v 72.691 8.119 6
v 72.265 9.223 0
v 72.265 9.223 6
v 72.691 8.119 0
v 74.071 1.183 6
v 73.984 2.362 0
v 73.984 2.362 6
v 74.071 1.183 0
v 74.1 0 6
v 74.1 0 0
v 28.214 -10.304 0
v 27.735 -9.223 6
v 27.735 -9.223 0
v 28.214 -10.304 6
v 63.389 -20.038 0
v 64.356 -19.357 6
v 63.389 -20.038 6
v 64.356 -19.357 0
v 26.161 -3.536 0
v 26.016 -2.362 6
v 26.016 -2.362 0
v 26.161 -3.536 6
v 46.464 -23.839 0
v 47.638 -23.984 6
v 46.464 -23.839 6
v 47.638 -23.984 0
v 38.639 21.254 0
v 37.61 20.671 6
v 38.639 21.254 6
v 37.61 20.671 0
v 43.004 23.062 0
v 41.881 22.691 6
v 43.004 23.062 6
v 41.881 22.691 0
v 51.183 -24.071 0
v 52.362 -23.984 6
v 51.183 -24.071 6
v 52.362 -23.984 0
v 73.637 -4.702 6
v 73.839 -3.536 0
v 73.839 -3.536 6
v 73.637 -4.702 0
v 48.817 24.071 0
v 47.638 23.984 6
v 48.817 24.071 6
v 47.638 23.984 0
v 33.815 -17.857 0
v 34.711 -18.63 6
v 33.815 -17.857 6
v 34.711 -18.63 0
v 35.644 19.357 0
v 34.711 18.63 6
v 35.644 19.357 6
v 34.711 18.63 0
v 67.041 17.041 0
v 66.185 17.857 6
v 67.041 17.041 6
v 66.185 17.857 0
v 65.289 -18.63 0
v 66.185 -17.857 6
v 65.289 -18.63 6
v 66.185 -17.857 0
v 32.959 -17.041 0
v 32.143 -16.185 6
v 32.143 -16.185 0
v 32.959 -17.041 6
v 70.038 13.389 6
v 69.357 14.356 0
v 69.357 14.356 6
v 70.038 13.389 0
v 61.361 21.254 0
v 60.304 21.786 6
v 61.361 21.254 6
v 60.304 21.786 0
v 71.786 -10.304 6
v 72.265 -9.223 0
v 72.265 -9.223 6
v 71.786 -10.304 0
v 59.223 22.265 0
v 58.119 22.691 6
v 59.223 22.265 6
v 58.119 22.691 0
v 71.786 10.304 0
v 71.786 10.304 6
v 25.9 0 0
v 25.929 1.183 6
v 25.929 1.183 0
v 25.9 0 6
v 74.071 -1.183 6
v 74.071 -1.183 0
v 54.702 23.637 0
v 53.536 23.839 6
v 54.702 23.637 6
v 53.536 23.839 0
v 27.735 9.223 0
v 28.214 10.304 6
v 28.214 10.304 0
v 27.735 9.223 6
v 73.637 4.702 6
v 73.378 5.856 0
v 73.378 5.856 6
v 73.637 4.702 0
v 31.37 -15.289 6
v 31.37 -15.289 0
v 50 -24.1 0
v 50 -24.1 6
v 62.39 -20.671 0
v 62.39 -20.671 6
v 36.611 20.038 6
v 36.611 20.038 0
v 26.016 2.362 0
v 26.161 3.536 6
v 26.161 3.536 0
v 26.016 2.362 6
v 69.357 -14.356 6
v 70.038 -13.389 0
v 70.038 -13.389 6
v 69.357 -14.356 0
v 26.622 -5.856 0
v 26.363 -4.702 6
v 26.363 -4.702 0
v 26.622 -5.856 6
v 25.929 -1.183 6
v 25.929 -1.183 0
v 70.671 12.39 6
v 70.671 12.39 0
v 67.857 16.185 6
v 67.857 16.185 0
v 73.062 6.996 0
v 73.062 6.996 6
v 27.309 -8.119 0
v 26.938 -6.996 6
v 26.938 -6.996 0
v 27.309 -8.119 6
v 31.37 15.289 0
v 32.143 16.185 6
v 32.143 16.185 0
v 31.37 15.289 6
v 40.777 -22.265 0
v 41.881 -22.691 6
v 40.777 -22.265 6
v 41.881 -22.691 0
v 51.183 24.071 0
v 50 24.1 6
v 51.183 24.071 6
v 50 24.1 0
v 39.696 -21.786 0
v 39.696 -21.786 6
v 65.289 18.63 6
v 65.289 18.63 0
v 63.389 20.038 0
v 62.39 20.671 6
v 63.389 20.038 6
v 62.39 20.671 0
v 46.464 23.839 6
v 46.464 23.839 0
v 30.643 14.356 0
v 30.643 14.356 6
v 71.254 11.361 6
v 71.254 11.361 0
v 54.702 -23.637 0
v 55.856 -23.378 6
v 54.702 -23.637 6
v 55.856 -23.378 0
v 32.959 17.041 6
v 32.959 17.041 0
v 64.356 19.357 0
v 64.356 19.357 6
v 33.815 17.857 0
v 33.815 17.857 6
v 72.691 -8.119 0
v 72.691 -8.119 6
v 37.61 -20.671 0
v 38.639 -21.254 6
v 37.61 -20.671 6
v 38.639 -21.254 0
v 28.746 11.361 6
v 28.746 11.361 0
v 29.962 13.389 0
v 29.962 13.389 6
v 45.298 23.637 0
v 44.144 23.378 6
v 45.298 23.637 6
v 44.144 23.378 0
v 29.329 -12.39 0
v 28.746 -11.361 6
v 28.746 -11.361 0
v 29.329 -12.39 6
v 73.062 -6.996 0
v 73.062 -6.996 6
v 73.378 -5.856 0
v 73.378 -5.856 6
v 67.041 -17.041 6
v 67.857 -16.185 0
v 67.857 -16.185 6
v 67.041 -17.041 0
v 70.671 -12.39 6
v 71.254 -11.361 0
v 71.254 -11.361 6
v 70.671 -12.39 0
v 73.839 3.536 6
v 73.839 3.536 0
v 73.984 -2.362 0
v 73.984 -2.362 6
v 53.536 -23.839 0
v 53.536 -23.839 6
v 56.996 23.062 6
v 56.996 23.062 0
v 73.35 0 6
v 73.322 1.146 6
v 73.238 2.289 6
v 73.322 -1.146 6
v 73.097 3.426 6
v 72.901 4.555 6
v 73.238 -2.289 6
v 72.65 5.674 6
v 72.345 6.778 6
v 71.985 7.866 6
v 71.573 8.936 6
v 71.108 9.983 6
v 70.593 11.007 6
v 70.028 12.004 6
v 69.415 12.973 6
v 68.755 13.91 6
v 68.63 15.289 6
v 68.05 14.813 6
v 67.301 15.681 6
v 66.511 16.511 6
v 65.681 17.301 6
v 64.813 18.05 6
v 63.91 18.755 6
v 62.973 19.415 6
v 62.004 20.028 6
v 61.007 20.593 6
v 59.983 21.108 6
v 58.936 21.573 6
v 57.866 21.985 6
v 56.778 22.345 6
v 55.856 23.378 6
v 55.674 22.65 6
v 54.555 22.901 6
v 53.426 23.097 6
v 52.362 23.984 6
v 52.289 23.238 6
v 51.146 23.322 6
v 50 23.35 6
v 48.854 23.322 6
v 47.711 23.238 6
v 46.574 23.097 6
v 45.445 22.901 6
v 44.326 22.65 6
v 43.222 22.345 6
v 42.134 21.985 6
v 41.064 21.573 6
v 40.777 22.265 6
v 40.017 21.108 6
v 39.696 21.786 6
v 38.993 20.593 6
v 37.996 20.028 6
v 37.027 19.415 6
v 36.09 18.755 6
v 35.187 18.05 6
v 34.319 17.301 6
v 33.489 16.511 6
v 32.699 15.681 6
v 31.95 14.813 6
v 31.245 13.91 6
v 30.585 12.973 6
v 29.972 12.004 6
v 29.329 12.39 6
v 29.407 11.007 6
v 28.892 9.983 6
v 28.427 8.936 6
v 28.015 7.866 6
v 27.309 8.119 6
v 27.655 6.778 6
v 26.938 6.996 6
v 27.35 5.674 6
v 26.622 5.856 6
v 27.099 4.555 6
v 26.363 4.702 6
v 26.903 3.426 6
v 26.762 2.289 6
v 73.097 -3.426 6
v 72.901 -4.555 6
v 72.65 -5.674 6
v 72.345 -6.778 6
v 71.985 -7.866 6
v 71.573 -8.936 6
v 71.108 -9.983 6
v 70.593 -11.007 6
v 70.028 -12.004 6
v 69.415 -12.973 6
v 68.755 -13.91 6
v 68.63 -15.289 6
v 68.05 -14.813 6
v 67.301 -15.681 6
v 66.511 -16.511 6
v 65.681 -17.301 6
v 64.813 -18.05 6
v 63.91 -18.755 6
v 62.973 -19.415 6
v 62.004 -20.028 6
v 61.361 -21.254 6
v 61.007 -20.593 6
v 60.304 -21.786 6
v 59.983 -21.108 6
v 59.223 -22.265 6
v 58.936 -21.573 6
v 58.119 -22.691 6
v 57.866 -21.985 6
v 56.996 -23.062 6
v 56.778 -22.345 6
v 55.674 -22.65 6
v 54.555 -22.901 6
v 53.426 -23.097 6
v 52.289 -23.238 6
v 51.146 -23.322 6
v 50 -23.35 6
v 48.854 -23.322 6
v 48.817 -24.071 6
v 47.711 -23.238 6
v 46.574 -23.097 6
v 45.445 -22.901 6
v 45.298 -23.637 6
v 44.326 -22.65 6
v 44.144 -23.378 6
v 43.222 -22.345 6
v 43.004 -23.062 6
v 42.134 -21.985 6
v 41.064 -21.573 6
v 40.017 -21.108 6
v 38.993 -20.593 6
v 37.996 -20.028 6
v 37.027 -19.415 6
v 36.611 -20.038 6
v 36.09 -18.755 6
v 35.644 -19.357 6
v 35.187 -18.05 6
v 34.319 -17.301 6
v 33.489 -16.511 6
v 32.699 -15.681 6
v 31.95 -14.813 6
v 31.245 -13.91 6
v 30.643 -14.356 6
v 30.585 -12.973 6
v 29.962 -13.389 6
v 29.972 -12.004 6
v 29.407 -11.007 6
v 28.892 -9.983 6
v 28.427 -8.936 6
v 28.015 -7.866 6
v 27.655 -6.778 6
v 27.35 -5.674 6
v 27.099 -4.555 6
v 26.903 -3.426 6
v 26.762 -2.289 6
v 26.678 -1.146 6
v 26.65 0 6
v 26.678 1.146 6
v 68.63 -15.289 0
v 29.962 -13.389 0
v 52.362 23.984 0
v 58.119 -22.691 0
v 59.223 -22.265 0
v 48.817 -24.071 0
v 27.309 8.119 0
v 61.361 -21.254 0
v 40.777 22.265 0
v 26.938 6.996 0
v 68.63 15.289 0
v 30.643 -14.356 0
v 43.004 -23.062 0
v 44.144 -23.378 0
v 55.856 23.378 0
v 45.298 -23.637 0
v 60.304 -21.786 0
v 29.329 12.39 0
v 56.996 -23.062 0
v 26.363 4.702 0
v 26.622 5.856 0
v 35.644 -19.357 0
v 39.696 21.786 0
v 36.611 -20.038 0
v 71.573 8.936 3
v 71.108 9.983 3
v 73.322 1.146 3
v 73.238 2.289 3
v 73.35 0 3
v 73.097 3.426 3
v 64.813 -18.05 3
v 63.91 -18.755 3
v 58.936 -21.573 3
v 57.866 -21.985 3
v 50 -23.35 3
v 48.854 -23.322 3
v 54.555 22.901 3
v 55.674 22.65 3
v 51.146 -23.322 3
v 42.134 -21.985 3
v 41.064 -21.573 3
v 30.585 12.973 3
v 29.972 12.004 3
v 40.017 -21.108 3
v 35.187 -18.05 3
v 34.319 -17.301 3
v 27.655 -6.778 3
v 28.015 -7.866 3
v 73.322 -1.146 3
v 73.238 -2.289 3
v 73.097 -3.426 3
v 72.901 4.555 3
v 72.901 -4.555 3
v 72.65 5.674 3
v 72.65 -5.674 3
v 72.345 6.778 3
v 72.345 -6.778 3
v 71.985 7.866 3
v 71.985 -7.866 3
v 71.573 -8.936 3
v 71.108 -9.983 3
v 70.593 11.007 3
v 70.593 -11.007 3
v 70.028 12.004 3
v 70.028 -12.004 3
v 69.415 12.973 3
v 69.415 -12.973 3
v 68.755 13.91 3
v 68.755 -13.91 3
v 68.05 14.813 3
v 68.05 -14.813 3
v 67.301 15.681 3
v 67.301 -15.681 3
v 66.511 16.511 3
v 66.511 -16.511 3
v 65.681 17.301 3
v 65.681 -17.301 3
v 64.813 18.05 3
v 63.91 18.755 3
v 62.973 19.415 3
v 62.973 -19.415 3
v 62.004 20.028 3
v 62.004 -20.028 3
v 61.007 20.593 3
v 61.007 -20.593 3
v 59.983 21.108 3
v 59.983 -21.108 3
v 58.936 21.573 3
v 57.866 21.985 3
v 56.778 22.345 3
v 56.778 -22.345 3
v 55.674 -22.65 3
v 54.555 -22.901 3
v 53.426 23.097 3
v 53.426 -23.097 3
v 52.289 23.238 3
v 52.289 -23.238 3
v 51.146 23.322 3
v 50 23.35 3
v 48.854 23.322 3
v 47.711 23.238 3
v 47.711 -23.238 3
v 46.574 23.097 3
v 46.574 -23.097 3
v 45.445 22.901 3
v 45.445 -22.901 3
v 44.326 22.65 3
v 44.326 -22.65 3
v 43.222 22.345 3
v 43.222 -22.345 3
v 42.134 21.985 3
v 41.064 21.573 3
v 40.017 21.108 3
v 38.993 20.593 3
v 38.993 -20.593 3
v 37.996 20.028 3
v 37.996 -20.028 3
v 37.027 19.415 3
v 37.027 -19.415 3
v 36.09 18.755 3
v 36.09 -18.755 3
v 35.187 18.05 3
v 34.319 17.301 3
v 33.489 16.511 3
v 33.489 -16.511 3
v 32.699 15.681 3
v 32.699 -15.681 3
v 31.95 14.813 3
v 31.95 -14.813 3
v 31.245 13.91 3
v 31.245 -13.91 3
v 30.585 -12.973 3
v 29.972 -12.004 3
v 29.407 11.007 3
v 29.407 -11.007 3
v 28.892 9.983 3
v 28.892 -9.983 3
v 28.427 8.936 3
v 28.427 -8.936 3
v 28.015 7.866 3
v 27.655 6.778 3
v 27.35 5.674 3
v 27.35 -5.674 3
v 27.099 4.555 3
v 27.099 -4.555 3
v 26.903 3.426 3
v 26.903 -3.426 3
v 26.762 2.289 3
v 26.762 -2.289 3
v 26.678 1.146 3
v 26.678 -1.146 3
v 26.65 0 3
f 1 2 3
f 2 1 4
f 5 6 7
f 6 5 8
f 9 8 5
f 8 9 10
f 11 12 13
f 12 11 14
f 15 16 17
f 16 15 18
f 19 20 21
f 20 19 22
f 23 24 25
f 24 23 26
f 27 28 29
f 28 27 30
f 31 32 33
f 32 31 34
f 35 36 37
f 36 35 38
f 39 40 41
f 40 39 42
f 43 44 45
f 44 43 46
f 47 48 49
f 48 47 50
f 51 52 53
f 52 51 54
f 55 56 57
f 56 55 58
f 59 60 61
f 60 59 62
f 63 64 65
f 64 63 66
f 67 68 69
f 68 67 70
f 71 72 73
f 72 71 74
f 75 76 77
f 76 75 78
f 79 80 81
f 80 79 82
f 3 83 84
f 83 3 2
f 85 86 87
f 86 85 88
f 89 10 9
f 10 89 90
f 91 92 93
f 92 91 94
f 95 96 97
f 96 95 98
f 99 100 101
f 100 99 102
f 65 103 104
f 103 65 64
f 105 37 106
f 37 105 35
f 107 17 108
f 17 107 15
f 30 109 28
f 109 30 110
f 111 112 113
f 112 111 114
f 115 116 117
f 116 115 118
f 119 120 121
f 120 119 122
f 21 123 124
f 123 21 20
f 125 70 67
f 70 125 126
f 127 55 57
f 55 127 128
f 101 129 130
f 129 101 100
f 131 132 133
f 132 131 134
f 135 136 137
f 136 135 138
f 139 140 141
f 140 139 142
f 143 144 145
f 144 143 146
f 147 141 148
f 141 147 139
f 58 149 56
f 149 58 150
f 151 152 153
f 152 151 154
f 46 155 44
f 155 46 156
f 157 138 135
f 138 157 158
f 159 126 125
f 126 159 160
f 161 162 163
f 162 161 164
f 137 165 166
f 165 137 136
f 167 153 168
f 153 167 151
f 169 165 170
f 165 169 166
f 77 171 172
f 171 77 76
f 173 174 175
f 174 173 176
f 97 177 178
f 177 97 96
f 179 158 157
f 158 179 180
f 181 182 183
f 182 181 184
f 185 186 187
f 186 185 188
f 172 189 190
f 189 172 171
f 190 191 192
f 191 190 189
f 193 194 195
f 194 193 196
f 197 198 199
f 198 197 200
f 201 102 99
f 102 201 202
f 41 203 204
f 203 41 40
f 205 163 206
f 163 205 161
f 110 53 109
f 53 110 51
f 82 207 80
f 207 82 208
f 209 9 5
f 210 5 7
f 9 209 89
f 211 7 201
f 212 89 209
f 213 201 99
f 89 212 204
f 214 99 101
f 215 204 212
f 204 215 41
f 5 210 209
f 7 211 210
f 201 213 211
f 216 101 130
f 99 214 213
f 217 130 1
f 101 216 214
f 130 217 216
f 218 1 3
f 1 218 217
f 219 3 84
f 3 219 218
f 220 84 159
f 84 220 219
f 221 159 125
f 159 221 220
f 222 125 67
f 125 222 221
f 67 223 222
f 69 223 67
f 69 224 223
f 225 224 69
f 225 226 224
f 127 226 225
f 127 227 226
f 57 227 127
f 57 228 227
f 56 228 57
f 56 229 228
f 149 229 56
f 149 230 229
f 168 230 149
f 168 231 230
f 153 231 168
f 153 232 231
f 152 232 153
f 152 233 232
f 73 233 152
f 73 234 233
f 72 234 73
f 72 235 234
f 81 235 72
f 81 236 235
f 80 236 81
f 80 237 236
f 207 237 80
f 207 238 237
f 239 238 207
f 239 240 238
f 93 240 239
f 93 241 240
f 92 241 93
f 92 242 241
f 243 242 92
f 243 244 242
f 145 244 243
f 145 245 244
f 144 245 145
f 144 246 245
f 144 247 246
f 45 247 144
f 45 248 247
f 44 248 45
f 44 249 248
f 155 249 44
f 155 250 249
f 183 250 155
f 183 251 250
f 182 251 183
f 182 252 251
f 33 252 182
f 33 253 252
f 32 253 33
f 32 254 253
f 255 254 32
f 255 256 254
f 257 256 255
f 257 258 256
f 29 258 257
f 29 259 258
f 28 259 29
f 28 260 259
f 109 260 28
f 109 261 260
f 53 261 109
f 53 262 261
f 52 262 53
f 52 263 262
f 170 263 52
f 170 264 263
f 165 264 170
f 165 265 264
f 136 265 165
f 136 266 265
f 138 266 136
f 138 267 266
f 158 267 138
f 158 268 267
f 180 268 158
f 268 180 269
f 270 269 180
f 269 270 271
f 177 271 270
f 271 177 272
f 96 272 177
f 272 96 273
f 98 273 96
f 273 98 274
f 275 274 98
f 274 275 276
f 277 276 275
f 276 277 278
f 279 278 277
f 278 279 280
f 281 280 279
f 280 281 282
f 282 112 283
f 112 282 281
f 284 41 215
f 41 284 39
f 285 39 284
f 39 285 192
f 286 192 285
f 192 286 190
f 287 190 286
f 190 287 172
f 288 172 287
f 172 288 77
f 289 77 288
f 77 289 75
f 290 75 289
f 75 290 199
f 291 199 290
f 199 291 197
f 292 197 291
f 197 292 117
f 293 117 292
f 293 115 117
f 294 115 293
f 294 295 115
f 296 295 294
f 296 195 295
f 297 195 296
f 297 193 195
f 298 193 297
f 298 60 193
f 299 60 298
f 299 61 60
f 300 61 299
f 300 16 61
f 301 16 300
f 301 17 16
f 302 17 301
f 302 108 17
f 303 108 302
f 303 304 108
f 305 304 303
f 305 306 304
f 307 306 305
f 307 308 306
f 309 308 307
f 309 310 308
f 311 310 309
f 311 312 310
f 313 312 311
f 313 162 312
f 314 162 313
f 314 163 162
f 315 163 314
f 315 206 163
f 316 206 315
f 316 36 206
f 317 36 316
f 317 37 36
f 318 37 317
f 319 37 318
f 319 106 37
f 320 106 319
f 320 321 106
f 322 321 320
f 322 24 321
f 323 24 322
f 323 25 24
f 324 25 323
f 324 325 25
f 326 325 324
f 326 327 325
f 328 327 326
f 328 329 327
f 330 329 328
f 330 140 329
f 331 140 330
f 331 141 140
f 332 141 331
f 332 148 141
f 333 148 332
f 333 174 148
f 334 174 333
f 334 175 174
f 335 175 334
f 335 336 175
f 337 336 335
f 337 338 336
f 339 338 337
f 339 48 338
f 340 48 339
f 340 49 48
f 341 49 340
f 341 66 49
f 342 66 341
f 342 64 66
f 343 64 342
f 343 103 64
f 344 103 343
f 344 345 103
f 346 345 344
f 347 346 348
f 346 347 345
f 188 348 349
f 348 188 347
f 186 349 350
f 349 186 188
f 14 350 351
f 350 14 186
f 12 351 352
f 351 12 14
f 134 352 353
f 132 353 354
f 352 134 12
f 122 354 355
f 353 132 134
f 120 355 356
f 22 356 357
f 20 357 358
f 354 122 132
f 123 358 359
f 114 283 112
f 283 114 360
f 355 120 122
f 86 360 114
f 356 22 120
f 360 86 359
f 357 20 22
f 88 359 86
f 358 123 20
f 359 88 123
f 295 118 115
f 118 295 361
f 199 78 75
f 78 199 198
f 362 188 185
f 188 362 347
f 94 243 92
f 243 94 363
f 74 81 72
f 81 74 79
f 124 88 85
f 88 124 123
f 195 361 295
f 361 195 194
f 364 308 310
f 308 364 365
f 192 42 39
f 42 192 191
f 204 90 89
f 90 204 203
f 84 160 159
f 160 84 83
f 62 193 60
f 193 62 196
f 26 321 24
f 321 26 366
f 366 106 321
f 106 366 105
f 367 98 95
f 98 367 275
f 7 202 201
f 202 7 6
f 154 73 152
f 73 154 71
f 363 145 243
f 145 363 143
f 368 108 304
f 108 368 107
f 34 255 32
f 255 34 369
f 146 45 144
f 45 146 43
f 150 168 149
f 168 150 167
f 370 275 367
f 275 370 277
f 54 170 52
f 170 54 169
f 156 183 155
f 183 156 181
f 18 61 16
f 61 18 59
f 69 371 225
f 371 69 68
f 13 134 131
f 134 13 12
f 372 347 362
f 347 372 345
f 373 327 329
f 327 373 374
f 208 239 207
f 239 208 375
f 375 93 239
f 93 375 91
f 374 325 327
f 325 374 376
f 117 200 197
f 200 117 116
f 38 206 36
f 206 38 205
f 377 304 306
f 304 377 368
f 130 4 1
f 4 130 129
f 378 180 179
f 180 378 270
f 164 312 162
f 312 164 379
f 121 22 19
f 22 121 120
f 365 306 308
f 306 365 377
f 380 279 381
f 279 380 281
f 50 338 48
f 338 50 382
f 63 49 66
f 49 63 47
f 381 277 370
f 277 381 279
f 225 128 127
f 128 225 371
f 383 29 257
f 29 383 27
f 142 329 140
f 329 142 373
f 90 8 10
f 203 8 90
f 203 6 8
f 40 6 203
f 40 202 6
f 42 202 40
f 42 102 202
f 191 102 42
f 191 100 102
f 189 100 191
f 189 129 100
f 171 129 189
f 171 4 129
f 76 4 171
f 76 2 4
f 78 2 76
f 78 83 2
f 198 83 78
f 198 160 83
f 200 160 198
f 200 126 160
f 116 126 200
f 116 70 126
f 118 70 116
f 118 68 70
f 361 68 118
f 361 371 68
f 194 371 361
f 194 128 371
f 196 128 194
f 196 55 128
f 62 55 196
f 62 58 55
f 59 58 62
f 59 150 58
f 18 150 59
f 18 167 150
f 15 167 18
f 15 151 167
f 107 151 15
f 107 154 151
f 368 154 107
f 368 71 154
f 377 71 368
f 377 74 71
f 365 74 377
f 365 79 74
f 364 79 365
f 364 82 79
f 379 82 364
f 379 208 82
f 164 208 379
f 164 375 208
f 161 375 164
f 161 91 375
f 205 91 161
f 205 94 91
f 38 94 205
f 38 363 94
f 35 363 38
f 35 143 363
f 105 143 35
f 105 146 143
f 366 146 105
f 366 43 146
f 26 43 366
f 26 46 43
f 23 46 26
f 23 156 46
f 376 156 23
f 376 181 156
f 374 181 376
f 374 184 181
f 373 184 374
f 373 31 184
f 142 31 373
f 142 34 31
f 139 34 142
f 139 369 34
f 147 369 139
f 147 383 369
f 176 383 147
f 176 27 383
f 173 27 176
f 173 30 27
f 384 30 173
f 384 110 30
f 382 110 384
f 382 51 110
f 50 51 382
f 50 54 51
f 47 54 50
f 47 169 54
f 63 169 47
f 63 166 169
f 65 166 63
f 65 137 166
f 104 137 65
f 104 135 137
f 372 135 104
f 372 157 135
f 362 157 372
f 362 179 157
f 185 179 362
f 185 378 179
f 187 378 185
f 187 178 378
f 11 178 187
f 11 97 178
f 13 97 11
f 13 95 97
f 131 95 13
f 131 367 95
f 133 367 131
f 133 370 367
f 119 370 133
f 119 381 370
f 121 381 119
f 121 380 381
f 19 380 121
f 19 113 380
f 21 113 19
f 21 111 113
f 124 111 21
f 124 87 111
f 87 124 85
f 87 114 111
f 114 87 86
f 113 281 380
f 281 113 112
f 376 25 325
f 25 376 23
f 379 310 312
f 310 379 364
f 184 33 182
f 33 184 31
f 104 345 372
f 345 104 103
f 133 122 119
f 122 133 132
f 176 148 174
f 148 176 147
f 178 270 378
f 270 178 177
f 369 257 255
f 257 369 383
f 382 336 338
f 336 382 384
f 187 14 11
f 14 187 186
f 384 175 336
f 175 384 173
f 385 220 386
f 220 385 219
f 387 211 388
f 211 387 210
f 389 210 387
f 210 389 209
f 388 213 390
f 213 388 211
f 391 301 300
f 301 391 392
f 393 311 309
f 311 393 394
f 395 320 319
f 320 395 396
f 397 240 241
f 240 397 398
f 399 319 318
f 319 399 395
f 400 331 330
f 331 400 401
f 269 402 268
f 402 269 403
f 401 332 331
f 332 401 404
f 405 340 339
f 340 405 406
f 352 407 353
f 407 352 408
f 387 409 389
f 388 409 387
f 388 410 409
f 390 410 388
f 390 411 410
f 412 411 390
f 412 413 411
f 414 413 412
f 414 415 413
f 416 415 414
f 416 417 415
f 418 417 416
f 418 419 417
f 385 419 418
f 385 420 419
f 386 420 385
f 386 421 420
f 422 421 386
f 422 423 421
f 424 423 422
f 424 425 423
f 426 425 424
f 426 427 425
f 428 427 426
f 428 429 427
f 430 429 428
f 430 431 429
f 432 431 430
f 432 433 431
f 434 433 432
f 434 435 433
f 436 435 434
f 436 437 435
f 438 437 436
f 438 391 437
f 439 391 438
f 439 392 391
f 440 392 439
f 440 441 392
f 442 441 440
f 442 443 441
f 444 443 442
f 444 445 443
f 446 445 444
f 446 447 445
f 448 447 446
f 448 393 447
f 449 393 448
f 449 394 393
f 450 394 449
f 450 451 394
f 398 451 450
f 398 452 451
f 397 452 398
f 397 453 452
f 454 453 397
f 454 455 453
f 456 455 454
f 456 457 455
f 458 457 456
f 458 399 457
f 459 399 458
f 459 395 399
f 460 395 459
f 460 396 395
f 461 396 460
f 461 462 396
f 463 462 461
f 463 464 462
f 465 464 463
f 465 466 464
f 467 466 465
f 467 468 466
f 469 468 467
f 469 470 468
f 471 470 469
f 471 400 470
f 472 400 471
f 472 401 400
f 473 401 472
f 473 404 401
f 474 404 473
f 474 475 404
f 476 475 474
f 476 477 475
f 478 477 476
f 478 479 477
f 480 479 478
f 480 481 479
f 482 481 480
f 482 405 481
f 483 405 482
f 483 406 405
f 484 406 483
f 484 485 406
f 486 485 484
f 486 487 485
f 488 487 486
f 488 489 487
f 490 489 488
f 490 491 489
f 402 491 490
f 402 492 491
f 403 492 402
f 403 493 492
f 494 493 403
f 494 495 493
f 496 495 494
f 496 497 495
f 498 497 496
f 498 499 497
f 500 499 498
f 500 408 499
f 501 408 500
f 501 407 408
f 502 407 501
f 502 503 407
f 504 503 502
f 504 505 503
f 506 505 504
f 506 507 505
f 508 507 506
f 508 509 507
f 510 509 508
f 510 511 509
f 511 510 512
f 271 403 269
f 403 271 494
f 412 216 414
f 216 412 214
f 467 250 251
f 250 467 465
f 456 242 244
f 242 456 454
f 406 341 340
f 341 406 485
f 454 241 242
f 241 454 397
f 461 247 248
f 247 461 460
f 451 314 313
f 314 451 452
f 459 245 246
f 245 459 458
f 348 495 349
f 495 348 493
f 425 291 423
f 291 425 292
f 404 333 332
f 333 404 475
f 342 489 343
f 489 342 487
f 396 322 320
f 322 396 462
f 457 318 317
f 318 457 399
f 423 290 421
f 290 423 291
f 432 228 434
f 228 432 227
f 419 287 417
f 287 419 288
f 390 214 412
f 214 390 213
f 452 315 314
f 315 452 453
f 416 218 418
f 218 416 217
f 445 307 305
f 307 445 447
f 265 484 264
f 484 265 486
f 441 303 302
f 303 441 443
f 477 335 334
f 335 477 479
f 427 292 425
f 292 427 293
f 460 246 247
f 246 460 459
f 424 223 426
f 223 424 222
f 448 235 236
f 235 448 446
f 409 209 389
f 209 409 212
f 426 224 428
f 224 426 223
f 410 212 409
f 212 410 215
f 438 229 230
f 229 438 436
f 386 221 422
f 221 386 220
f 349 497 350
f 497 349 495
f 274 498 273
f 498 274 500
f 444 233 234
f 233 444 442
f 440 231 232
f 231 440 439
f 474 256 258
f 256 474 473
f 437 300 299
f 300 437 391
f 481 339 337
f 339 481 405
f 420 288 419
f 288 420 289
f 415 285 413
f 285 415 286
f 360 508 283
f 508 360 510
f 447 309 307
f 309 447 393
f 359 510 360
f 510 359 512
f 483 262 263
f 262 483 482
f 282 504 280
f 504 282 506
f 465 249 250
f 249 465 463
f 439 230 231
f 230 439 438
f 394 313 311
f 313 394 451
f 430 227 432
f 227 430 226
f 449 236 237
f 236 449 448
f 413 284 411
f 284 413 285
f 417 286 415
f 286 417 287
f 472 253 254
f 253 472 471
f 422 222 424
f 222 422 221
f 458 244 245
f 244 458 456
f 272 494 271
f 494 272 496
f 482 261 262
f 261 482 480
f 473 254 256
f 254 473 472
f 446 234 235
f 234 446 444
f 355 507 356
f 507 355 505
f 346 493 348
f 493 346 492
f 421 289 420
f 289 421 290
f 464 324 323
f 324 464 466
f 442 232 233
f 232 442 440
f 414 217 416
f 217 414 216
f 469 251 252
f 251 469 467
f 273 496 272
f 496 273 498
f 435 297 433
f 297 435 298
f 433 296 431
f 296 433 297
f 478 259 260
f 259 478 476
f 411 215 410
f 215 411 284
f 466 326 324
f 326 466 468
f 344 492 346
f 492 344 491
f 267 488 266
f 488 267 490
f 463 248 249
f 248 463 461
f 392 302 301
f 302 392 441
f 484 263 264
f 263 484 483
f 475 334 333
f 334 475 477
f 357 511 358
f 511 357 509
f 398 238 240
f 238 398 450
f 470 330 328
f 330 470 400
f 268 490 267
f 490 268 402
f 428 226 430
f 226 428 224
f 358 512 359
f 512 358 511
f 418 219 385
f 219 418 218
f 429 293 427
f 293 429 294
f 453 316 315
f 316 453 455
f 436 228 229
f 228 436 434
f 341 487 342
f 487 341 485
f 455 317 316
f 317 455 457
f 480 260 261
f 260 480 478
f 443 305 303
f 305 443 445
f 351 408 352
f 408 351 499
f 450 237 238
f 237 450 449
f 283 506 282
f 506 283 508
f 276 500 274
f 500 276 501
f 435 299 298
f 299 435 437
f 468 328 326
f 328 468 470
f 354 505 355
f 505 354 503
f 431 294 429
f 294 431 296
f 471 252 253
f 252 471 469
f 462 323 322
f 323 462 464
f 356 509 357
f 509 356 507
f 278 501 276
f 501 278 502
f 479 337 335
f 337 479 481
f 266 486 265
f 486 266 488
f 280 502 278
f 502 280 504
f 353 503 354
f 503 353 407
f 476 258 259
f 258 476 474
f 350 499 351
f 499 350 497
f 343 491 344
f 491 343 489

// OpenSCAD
// Lamp dimentions
lamp_h = 66;
lamp_d = 40;

// Luft
lamp_h_sp = 20;
lamp_d_sp = 5;

// Vegger
wall = 1.5;
bottom = wall * 2;

// Høl
holes1 = 5;

slits_x = 2;
slits_z = 10;

// bolske
print_box = 0;
print_lid = 1;

module perforering() {
    translate([0,lamp_d,lamp_h/5]) {
        rotate([90,0,0]) {
            cube([slits_x,slits_z,lamp_d*2]);
        }
    }
    rotate([0,0,30]) {
        translate([0,lamp_d,lamp_h/5]) {
            rotate([90,0,0]) {
                cube([slits_x,slits_z,lamp_d*2]);
            }
        }
    }
    rotate([0,0,60]) {
        translate([0,lamp_d,lamp_h/5]) {
            rotate([90,0,0]) {
                cube([slits_x,slits_z,lamp_d*2]);
            }
        }
    }
    rotate([0,0,90]) {
        translate([0,lamp_d,lamp_h/5]) {
            rotate([90,0,0]) {
                cube([slits_x,slits_z,lamp_d*2]);
            }
        }
    }
    rotate([0,0,120]) {
        translate([0,lamp_d,lamp_h/5]) {
            rotate([90,0,0]) {
                cube([slits_x,slits_z,lamp_d*2]);
            }
        }
    }
    rotate([0,0,150]) {
        translate([0,lamp_d,lamp_h/5]) {
            rotate([90,0,0]) {
                cube([slits_x,slits_z,lamp_d*2]);
            }
        }
    }
}

// Kode
if (print_box) {
    difference() {
        cylinder(d=lamp_d+lamp_d_sp+wall, h=lamp_h+lamp_h_sp+wall, $fn=128);
        translate([0,0,bottom]) {
            cylinder(d=lamp_d+lamp_d_sp, h=lamp_h+lamp_h_sp, $fn=128);
        }
        perforering();
        rotate([0,0,22.5])
            translate([0,0,lamp_h/3.8])
                perforering();
        rotate([0,0,45])
            translate([0,0,lamp_h/3.8*2])
                perforering();
        rotate([0,0,67.5])
            translate([0,0,lamp_h/3.8*3])
                perforering();
    }
}

if (print_lid) {
    translate([lamp_d+lamp_d_sp*2,0,0]) {
        difference() {
            cylinder(d=lamp_d+lamp_d_sp+wall*2+0.2, h=wall*4, $fn=128);
            translate([0,0,bottom]) {
                cylinder(d=lamp_d+lamp_d_sp+wall+0.2, h=lamp_h+lamp_h_sp, $fn=128);
            }    
        }
    }
}
